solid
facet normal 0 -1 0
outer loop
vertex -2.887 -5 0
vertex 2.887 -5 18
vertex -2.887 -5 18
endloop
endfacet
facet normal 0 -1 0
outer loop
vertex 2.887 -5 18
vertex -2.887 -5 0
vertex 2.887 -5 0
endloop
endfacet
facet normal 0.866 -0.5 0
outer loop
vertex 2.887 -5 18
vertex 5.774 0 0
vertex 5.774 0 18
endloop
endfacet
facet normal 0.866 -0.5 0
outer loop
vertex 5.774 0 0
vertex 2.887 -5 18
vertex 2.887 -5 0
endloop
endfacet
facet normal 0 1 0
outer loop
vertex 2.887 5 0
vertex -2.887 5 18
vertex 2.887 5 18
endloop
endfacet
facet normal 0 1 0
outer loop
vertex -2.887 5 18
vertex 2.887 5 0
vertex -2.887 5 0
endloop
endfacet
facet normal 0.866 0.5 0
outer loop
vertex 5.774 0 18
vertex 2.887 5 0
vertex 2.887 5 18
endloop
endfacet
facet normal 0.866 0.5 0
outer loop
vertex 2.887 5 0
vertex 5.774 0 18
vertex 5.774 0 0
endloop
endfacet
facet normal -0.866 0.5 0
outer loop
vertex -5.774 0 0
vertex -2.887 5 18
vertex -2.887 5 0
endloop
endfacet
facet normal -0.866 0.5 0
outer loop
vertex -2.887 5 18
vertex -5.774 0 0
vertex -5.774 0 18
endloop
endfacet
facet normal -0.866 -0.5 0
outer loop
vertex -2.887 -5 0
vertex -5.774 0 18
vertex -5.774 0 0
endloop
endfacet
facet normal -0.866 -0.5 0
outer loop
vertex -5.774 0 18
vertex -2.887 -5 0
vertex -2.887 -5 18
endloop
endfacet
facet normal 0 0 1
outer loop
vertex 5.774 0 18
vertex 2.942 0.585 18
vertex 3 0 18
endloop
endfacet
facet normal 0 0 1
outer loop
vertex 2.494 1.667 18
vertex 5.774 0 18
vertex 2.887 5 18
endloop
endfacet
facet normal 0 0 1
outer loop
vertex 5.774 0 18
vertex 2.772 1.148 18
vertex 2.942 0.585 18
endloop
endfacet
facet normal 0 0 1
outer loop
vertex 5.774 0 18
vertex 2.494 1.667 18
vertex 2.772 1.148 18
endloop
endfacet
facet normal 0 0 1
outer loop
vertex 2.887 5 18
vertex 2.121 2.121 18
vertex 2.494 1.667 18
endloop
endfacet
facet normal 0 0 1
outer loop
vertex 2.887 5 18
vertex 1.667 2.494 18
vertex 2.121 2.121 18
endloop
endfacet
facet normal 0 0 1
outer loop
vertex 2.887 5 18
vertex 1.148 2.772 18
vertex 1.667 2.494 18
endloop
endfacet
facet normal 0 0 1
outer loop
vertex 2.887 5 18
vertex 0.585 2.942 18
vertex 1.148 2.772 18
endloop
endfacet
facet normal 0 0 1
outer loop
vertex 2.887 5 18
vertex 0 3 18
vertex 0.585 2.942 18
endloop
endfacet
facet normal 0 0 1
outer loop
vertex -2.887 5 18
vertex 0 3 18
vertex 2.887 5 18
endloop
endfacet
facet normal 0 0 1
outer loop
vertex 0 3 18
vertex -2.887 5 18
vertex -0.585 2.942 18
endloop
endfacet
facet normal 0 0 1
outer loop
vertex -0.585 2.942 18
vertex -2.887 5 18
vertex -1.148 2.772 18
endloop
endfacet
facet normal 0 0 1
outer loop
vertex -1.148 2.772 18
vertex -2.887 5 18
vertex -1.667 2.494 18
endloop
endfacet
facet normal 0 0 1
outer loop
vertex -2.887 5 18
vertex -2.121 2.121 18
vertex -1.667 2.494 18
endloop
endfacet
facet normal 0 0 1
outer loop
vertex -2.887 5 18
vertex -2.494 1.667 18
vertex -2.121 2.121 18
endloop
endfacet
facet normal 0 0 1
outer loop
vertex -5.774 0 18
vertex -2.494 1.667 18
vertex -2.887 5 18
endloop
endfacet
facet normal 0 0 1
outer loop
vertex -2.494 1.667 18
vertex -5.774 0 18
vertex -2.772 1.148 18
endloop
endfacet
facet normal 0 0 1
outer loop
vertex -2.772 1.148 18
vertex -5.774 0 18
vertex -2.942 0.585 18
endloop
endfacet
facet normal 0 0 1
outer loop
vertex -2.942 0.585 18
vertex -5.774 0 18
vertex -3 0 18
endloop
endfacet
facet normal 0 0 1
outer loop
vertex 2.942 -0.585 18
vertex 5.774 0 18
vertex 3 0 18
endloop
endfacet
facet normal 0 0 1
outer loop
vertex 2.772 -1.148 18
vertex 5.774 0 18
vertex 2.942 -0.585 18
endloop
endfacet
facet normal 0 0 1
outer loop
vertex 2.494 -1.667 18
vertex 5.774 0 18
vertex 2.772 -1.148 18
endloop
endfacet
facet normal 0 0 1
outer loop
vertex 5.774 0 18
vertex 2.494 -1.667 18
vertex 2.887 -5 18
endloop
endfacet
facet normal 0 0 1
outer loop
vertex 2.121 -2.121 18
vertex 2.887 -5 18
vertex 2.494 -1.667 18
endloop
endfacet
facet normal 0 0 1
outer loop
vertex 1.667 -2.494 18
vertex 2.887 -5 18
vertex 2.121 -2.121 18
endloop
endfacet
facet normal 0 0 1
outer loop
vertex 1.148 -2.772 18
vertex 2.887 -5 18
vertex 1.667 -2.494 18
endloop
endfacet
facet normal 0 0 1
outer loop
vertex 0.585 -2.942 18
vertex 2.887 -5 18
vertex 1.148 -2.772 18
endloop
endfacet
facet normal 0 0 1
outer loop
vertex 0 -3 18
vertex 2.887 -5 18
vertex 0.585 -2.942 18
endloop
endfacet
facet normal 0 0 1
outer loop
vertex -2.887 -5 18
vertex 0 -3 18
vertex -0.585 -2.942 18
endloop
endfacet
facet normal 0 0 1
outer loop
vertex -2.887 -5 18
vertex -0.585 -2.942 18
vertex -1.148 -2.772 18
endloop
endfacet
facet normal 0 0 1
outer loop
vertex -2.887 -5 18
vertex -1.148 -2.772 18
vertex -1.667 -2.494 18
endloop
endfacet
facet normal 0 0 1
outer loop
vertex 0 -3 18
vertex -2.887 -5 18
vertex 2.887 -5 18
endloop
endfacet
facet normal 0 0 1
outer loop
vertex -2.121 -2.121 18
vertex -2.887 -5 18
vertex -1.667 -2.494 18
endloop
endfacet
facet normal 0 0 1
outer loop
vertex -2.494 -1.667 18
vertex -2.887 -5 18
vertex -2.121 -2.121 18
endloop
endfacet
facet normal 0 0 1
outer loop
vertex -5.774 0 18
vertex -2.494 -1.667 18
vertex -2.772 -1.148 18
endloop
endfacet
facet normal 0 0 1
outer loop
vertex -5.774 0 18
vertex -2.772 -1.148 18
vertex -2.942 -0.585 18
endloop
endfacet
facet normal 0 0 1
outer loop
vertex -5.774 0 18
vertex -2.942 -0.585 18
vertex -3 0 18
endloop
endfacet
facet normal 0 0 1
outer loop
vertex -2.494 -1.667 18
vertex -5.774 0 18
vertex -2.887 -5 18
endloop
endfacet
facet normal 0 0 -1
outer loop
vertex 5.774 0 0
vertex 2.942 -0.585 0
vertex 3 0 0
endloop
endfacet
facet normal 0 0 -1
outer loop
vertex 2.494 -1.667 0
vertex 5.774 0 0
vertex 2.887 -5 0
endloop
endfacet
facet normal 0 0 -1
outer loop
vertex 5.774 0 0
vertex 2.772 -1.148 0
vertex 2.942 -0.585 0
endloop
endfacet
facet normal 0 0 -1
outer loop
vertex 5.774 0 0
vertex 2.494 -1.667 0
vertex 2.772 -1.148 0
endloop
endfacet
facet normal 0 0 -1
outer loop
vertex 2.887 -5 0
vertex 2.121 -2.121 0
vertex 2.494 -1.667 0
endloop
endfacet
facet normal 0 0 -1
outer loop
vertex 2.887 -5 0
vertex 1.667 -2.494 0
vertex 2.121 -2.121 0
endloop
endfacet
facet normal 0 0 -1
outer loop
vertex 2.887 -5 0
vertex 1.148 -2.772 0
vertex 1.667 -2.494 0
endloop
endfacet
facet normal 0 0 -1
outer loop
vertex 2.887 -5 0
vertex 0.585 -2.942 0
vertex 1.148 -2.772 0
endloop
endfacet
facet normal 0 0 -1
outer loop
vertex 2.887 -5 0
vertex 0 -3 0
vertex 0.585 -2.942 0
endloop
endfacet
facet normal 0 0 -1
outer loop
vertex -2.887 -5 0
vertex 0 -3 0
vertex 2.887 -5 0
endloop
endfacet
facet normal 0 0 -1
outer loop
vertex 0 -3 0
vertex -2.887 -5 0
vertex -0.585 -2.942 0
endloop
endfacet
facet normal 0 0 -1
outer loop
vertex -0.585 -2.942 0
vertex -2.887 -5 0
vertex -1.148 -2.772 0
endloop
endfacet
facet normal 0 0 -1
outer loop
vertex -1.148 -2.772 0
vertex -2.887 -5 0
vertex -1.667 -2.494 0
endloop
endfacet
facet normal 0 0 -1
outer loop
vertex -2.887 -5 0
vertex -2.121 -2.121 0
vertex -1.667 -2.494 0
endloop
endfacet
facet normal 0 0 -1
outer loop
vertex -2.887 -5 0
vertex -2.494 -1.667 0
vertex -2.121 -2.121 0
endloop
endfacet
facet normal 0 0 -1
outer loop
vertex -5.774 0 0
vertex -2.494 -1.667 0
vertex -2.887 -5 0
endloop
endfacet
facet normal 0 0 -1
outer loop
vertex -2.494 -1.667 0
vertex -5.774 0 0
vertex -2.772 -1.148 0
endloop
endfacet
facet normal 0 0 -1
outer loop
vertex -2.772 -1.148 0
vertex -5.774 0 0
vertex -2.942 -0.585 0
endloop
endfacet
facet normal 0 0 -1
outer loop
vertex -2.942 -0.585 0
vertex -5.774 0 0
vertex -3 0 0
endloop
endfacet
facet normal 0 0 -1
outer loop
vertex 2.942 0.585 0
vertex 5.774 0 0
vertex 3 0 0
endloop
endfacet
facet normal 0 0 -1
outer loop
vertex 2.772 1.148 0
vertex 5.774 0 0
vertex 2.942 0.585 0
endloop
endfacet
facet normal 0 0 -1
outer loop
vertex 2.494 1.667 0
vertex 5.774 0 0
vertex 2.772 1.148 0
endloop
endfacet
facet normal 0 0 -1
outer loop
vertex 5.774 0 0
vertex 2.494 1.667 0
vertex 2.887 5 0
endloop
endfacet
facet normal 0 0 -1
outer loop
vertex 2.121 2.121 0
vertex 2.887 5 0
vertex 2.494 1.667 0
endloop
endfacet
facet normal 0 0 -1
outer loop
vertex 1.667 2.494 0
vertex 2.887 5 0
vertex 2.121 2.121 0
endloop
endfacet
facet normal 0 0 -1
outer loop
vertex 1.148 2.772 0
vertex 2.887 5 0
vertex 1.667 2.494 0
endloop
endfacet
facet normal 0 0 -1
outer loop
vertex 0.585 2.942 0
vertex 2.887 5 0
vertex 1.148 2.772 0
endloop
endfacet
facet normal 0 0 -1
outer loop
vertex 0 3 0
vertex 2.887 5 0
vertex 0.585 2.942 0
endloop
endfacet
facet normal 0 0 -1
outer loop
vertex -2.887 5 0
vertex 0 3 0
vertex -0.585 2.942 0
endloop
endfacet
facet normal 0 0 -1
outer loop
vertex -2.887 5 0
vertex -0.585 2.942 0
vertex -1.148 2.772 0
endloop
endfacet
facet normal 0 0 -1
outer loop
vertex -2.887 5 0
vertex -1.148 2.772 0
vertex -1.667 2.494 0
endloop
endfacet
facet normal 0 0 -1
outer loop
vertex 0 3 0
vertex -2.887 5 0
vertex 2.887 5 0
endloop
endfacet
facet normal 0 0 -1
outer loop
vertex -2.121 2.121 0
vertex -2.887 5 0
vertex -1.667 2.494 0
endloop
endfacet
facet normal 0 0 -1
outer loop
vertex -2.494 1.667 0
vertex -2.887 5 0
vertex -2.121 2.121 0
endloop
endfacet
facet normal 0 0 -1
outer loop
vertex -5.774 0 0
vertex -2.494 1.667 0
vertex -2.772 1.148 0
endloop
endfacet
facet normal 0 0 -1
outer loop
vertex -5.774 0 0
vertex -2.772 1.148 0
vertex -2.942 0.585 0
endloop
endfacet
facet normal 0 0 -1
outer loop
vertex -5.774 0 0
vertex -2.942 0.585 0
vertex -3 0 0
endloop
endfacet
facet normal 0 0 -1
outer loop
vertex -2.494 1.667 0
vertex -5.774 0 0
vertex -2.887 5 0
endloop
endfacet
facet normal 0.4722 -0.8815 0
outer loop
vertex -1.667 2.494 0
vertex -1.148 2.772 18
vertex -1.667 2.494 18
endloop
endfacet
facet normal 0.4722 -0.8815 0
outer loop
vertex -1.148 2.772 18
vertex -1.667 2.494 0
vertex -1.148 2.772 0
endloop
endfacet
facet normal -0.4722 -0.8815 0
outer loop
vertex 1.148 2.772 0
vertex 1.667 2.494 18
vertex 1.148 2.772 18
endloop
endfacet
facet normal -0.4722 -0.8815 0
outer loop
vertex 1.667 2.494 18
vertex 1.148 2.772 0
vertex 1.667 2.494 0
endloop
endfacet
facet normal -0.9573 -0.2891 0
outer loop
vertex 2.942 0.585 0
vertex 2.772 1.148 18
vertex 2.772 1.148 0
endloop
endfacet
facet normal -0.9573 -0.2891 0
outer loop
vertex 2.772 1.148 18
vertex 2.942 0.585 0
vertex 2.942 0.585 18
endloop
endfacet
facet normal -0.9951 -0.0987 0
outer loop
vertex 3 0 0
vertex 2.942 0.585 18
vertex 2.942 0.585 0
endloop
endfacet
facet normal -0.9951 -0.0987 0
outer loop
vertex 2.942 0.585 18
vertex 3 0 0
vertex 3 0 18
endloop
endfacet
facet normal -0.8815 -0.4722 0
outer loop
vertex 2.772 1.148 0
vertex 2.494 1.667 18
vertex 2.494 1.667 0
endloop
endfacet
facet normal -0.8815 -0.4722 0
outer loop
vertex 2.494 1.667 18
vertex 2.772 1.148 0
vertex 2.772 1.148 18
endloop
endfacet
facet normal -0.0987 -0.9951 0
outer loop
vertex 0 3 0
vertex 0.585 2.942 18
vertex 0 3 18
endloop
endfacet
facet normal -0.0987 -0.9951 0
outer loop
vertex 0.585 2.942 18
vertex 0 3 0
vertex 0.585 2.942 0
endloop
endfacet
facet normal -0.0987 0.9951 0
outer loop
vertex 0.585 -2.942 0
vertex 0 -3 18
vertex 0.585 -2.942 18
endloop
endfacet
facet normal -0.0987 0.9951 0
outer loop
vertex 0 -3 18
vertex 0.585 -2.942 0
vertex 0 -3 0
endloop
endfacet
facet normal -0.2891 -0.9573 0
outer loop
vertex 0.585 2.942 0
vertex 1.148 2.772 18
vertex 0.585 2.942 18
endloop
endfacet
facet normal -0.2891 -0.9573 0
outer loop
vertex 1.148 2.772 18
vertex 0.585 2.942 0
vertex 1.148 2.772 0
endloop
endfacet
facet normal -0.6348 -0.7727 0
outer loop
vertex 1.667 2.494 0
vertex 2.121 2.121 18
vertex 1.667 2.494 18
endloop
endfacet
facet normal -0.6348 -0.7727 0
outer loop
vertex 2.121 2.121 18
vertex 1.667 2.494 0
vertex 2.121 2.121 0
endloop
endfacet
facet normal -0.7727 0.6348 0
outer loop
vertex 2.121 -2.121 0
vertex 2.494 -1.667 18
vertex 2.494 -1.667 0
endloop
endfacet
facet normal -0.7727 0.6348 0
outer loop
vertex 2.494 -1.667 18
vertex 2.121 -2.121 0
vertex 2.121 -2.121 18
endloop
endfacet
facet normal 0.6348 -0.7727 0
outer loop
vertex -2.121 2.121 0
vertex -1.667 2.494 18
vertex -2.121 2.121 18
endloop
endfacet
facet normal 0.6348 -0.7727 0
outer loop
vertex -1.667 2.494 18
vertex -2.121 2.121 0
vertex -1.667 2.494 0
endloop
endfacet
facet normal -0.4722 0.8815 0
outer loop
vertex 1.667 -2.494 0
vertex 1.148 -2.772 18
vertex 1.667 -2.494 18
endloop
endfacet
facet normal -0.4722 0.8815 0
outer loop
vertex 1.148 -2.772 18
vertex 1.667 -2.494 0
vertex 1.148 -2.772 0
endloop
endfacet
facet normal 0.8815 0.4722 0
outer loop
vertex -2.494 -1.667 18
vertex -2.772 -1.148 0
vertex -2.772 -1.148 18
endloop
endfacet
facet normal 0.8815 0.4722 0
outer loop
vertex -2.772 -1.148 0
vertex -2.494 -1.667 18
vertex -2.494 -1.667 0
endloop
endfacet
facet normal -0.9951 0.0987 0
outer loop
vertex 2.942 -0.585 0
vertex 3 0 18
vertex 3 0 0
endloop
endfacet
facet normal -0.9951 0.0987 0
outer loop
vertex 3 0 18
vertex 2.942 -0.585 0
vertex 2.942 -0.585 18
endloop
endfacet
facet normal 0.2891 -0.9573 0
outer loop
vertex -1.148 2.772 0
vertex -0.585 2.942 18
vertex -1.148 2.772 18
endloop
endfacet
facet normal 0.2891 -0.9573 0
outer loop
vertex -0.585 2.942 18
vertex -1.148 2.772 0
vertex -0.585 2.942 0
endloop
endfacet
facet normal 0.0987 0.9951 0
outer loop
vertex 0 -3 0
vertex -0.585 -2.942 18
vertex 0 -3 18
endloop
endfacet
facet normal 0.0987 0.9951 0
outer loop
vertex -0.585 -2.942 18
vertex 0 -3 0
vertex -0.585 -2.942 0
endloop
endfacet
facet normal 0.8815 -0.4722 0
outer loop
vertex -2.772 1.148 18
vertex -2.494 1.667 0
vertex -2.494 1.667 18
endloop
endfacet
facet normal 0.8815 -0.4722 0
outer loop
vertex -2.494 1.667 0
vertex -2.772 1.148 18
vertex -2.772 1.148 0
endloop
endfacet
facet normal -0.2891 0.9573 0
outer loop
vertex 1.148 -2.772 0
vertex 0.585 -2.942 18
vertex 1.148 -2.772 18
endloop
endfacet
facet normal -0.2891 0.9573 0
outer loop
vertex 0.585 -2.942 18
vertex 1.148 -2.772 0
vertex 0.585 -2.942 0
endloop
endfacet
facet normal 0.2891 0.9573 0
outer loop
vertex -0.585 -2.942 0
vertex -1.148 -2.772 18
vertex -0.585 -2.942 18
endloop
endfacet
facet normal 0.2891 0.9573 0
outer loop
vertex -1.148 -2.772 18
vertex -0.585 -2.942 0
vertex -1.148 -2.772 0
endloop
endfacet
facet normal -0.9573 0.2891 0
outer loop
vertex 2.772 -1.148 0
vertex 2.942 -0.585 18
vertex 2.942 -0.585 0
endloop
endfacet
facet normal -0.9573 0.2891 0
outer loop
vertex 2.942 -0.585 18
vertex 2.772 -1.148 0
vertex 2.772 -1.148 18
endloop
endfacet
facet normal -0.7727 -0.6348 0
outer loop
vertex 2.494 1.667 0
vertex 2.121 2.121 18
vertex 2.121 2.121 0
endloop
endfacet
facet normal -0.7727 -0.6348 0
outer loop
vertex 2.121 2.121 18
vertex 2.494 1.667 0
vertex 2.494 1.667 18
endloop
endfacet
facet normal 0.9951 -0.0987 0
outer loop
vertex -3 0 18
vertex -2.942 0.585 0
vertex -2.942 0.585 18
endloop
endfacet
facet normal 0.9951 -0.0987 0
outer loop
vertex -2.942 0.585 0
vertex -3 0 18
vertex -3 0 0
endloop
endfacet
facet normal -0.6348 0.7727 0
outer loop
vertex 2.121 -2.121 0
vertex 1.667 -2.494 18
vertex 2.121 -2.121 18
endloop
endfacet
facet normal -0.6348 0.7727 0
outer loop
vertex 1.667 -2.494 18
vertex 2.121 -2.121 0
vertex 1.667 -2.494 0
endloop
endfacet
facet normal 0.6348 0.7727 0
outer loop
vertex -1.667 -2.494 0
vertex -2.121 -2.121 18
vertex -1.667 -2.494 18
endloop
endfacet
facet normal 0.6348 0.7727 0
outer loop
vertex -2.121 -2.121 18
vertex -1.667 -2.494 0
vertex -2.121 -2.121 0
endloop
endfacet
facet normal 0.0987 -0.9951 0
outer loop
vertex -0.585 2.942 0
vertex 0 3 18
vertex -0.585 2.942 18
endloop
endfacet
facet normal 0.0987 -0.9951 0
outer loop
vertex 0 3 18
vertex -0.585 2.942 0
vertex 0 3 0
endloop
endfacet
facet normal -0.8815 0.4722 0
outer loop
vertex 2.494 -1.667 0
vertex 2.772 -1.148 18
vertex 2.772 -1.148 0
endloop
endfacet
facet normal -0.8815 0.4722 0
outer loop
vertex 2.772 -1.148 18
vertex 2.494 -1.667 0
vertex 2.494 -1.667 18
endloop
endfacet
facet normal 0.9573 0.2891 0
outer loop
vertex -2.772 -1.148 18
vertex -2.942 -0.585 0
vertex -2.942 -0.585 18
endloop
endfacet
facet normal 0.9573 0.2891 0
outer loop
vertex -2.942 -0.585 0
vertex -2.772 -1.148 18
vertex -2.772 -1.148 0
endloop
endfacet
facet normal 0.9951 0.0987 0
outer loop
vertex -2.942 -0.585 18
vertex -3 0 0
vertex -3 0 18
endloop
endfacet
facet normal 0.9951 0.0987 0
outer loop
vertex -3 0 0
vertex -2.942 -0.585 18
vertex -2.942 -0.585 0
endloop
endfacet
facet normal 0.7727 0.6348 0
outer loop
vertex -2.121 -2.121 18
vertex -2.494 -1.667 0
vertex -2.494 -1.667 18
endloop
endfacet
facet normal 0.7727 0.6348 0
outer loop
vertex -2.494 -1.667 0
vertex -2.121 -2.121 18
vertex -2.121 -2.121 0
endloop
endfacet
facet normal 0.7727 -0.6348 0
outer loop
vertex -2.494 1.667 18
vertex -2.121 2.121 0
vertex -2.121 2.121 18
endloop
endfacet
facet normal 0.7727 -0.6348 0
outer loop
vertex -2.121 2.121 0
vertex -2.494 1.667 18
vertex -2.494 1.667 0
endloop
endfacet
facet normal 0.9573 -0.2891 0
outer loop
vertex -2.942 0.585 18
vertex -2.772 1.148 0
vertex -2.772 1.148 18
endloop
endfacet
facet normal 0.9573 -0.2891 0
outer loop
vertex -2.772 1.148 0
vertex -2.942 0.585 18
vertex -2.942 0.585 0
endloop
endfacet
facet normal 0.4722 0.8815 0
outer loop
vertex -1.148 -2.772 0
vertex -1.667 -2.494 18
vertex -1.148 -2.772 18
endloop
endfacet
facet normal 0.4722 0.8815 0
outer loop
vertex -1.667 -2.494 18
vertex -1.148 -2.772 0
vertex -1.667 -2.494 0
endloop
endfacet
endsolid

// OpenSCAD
// Purchased hardware envelope; no modeled threads, not print.
$fn=32;
difference(){cylinder(d=10/cos(30),h=18,$fn=6);translate([0,0,-1])cylinder(d=6,h=20);}
